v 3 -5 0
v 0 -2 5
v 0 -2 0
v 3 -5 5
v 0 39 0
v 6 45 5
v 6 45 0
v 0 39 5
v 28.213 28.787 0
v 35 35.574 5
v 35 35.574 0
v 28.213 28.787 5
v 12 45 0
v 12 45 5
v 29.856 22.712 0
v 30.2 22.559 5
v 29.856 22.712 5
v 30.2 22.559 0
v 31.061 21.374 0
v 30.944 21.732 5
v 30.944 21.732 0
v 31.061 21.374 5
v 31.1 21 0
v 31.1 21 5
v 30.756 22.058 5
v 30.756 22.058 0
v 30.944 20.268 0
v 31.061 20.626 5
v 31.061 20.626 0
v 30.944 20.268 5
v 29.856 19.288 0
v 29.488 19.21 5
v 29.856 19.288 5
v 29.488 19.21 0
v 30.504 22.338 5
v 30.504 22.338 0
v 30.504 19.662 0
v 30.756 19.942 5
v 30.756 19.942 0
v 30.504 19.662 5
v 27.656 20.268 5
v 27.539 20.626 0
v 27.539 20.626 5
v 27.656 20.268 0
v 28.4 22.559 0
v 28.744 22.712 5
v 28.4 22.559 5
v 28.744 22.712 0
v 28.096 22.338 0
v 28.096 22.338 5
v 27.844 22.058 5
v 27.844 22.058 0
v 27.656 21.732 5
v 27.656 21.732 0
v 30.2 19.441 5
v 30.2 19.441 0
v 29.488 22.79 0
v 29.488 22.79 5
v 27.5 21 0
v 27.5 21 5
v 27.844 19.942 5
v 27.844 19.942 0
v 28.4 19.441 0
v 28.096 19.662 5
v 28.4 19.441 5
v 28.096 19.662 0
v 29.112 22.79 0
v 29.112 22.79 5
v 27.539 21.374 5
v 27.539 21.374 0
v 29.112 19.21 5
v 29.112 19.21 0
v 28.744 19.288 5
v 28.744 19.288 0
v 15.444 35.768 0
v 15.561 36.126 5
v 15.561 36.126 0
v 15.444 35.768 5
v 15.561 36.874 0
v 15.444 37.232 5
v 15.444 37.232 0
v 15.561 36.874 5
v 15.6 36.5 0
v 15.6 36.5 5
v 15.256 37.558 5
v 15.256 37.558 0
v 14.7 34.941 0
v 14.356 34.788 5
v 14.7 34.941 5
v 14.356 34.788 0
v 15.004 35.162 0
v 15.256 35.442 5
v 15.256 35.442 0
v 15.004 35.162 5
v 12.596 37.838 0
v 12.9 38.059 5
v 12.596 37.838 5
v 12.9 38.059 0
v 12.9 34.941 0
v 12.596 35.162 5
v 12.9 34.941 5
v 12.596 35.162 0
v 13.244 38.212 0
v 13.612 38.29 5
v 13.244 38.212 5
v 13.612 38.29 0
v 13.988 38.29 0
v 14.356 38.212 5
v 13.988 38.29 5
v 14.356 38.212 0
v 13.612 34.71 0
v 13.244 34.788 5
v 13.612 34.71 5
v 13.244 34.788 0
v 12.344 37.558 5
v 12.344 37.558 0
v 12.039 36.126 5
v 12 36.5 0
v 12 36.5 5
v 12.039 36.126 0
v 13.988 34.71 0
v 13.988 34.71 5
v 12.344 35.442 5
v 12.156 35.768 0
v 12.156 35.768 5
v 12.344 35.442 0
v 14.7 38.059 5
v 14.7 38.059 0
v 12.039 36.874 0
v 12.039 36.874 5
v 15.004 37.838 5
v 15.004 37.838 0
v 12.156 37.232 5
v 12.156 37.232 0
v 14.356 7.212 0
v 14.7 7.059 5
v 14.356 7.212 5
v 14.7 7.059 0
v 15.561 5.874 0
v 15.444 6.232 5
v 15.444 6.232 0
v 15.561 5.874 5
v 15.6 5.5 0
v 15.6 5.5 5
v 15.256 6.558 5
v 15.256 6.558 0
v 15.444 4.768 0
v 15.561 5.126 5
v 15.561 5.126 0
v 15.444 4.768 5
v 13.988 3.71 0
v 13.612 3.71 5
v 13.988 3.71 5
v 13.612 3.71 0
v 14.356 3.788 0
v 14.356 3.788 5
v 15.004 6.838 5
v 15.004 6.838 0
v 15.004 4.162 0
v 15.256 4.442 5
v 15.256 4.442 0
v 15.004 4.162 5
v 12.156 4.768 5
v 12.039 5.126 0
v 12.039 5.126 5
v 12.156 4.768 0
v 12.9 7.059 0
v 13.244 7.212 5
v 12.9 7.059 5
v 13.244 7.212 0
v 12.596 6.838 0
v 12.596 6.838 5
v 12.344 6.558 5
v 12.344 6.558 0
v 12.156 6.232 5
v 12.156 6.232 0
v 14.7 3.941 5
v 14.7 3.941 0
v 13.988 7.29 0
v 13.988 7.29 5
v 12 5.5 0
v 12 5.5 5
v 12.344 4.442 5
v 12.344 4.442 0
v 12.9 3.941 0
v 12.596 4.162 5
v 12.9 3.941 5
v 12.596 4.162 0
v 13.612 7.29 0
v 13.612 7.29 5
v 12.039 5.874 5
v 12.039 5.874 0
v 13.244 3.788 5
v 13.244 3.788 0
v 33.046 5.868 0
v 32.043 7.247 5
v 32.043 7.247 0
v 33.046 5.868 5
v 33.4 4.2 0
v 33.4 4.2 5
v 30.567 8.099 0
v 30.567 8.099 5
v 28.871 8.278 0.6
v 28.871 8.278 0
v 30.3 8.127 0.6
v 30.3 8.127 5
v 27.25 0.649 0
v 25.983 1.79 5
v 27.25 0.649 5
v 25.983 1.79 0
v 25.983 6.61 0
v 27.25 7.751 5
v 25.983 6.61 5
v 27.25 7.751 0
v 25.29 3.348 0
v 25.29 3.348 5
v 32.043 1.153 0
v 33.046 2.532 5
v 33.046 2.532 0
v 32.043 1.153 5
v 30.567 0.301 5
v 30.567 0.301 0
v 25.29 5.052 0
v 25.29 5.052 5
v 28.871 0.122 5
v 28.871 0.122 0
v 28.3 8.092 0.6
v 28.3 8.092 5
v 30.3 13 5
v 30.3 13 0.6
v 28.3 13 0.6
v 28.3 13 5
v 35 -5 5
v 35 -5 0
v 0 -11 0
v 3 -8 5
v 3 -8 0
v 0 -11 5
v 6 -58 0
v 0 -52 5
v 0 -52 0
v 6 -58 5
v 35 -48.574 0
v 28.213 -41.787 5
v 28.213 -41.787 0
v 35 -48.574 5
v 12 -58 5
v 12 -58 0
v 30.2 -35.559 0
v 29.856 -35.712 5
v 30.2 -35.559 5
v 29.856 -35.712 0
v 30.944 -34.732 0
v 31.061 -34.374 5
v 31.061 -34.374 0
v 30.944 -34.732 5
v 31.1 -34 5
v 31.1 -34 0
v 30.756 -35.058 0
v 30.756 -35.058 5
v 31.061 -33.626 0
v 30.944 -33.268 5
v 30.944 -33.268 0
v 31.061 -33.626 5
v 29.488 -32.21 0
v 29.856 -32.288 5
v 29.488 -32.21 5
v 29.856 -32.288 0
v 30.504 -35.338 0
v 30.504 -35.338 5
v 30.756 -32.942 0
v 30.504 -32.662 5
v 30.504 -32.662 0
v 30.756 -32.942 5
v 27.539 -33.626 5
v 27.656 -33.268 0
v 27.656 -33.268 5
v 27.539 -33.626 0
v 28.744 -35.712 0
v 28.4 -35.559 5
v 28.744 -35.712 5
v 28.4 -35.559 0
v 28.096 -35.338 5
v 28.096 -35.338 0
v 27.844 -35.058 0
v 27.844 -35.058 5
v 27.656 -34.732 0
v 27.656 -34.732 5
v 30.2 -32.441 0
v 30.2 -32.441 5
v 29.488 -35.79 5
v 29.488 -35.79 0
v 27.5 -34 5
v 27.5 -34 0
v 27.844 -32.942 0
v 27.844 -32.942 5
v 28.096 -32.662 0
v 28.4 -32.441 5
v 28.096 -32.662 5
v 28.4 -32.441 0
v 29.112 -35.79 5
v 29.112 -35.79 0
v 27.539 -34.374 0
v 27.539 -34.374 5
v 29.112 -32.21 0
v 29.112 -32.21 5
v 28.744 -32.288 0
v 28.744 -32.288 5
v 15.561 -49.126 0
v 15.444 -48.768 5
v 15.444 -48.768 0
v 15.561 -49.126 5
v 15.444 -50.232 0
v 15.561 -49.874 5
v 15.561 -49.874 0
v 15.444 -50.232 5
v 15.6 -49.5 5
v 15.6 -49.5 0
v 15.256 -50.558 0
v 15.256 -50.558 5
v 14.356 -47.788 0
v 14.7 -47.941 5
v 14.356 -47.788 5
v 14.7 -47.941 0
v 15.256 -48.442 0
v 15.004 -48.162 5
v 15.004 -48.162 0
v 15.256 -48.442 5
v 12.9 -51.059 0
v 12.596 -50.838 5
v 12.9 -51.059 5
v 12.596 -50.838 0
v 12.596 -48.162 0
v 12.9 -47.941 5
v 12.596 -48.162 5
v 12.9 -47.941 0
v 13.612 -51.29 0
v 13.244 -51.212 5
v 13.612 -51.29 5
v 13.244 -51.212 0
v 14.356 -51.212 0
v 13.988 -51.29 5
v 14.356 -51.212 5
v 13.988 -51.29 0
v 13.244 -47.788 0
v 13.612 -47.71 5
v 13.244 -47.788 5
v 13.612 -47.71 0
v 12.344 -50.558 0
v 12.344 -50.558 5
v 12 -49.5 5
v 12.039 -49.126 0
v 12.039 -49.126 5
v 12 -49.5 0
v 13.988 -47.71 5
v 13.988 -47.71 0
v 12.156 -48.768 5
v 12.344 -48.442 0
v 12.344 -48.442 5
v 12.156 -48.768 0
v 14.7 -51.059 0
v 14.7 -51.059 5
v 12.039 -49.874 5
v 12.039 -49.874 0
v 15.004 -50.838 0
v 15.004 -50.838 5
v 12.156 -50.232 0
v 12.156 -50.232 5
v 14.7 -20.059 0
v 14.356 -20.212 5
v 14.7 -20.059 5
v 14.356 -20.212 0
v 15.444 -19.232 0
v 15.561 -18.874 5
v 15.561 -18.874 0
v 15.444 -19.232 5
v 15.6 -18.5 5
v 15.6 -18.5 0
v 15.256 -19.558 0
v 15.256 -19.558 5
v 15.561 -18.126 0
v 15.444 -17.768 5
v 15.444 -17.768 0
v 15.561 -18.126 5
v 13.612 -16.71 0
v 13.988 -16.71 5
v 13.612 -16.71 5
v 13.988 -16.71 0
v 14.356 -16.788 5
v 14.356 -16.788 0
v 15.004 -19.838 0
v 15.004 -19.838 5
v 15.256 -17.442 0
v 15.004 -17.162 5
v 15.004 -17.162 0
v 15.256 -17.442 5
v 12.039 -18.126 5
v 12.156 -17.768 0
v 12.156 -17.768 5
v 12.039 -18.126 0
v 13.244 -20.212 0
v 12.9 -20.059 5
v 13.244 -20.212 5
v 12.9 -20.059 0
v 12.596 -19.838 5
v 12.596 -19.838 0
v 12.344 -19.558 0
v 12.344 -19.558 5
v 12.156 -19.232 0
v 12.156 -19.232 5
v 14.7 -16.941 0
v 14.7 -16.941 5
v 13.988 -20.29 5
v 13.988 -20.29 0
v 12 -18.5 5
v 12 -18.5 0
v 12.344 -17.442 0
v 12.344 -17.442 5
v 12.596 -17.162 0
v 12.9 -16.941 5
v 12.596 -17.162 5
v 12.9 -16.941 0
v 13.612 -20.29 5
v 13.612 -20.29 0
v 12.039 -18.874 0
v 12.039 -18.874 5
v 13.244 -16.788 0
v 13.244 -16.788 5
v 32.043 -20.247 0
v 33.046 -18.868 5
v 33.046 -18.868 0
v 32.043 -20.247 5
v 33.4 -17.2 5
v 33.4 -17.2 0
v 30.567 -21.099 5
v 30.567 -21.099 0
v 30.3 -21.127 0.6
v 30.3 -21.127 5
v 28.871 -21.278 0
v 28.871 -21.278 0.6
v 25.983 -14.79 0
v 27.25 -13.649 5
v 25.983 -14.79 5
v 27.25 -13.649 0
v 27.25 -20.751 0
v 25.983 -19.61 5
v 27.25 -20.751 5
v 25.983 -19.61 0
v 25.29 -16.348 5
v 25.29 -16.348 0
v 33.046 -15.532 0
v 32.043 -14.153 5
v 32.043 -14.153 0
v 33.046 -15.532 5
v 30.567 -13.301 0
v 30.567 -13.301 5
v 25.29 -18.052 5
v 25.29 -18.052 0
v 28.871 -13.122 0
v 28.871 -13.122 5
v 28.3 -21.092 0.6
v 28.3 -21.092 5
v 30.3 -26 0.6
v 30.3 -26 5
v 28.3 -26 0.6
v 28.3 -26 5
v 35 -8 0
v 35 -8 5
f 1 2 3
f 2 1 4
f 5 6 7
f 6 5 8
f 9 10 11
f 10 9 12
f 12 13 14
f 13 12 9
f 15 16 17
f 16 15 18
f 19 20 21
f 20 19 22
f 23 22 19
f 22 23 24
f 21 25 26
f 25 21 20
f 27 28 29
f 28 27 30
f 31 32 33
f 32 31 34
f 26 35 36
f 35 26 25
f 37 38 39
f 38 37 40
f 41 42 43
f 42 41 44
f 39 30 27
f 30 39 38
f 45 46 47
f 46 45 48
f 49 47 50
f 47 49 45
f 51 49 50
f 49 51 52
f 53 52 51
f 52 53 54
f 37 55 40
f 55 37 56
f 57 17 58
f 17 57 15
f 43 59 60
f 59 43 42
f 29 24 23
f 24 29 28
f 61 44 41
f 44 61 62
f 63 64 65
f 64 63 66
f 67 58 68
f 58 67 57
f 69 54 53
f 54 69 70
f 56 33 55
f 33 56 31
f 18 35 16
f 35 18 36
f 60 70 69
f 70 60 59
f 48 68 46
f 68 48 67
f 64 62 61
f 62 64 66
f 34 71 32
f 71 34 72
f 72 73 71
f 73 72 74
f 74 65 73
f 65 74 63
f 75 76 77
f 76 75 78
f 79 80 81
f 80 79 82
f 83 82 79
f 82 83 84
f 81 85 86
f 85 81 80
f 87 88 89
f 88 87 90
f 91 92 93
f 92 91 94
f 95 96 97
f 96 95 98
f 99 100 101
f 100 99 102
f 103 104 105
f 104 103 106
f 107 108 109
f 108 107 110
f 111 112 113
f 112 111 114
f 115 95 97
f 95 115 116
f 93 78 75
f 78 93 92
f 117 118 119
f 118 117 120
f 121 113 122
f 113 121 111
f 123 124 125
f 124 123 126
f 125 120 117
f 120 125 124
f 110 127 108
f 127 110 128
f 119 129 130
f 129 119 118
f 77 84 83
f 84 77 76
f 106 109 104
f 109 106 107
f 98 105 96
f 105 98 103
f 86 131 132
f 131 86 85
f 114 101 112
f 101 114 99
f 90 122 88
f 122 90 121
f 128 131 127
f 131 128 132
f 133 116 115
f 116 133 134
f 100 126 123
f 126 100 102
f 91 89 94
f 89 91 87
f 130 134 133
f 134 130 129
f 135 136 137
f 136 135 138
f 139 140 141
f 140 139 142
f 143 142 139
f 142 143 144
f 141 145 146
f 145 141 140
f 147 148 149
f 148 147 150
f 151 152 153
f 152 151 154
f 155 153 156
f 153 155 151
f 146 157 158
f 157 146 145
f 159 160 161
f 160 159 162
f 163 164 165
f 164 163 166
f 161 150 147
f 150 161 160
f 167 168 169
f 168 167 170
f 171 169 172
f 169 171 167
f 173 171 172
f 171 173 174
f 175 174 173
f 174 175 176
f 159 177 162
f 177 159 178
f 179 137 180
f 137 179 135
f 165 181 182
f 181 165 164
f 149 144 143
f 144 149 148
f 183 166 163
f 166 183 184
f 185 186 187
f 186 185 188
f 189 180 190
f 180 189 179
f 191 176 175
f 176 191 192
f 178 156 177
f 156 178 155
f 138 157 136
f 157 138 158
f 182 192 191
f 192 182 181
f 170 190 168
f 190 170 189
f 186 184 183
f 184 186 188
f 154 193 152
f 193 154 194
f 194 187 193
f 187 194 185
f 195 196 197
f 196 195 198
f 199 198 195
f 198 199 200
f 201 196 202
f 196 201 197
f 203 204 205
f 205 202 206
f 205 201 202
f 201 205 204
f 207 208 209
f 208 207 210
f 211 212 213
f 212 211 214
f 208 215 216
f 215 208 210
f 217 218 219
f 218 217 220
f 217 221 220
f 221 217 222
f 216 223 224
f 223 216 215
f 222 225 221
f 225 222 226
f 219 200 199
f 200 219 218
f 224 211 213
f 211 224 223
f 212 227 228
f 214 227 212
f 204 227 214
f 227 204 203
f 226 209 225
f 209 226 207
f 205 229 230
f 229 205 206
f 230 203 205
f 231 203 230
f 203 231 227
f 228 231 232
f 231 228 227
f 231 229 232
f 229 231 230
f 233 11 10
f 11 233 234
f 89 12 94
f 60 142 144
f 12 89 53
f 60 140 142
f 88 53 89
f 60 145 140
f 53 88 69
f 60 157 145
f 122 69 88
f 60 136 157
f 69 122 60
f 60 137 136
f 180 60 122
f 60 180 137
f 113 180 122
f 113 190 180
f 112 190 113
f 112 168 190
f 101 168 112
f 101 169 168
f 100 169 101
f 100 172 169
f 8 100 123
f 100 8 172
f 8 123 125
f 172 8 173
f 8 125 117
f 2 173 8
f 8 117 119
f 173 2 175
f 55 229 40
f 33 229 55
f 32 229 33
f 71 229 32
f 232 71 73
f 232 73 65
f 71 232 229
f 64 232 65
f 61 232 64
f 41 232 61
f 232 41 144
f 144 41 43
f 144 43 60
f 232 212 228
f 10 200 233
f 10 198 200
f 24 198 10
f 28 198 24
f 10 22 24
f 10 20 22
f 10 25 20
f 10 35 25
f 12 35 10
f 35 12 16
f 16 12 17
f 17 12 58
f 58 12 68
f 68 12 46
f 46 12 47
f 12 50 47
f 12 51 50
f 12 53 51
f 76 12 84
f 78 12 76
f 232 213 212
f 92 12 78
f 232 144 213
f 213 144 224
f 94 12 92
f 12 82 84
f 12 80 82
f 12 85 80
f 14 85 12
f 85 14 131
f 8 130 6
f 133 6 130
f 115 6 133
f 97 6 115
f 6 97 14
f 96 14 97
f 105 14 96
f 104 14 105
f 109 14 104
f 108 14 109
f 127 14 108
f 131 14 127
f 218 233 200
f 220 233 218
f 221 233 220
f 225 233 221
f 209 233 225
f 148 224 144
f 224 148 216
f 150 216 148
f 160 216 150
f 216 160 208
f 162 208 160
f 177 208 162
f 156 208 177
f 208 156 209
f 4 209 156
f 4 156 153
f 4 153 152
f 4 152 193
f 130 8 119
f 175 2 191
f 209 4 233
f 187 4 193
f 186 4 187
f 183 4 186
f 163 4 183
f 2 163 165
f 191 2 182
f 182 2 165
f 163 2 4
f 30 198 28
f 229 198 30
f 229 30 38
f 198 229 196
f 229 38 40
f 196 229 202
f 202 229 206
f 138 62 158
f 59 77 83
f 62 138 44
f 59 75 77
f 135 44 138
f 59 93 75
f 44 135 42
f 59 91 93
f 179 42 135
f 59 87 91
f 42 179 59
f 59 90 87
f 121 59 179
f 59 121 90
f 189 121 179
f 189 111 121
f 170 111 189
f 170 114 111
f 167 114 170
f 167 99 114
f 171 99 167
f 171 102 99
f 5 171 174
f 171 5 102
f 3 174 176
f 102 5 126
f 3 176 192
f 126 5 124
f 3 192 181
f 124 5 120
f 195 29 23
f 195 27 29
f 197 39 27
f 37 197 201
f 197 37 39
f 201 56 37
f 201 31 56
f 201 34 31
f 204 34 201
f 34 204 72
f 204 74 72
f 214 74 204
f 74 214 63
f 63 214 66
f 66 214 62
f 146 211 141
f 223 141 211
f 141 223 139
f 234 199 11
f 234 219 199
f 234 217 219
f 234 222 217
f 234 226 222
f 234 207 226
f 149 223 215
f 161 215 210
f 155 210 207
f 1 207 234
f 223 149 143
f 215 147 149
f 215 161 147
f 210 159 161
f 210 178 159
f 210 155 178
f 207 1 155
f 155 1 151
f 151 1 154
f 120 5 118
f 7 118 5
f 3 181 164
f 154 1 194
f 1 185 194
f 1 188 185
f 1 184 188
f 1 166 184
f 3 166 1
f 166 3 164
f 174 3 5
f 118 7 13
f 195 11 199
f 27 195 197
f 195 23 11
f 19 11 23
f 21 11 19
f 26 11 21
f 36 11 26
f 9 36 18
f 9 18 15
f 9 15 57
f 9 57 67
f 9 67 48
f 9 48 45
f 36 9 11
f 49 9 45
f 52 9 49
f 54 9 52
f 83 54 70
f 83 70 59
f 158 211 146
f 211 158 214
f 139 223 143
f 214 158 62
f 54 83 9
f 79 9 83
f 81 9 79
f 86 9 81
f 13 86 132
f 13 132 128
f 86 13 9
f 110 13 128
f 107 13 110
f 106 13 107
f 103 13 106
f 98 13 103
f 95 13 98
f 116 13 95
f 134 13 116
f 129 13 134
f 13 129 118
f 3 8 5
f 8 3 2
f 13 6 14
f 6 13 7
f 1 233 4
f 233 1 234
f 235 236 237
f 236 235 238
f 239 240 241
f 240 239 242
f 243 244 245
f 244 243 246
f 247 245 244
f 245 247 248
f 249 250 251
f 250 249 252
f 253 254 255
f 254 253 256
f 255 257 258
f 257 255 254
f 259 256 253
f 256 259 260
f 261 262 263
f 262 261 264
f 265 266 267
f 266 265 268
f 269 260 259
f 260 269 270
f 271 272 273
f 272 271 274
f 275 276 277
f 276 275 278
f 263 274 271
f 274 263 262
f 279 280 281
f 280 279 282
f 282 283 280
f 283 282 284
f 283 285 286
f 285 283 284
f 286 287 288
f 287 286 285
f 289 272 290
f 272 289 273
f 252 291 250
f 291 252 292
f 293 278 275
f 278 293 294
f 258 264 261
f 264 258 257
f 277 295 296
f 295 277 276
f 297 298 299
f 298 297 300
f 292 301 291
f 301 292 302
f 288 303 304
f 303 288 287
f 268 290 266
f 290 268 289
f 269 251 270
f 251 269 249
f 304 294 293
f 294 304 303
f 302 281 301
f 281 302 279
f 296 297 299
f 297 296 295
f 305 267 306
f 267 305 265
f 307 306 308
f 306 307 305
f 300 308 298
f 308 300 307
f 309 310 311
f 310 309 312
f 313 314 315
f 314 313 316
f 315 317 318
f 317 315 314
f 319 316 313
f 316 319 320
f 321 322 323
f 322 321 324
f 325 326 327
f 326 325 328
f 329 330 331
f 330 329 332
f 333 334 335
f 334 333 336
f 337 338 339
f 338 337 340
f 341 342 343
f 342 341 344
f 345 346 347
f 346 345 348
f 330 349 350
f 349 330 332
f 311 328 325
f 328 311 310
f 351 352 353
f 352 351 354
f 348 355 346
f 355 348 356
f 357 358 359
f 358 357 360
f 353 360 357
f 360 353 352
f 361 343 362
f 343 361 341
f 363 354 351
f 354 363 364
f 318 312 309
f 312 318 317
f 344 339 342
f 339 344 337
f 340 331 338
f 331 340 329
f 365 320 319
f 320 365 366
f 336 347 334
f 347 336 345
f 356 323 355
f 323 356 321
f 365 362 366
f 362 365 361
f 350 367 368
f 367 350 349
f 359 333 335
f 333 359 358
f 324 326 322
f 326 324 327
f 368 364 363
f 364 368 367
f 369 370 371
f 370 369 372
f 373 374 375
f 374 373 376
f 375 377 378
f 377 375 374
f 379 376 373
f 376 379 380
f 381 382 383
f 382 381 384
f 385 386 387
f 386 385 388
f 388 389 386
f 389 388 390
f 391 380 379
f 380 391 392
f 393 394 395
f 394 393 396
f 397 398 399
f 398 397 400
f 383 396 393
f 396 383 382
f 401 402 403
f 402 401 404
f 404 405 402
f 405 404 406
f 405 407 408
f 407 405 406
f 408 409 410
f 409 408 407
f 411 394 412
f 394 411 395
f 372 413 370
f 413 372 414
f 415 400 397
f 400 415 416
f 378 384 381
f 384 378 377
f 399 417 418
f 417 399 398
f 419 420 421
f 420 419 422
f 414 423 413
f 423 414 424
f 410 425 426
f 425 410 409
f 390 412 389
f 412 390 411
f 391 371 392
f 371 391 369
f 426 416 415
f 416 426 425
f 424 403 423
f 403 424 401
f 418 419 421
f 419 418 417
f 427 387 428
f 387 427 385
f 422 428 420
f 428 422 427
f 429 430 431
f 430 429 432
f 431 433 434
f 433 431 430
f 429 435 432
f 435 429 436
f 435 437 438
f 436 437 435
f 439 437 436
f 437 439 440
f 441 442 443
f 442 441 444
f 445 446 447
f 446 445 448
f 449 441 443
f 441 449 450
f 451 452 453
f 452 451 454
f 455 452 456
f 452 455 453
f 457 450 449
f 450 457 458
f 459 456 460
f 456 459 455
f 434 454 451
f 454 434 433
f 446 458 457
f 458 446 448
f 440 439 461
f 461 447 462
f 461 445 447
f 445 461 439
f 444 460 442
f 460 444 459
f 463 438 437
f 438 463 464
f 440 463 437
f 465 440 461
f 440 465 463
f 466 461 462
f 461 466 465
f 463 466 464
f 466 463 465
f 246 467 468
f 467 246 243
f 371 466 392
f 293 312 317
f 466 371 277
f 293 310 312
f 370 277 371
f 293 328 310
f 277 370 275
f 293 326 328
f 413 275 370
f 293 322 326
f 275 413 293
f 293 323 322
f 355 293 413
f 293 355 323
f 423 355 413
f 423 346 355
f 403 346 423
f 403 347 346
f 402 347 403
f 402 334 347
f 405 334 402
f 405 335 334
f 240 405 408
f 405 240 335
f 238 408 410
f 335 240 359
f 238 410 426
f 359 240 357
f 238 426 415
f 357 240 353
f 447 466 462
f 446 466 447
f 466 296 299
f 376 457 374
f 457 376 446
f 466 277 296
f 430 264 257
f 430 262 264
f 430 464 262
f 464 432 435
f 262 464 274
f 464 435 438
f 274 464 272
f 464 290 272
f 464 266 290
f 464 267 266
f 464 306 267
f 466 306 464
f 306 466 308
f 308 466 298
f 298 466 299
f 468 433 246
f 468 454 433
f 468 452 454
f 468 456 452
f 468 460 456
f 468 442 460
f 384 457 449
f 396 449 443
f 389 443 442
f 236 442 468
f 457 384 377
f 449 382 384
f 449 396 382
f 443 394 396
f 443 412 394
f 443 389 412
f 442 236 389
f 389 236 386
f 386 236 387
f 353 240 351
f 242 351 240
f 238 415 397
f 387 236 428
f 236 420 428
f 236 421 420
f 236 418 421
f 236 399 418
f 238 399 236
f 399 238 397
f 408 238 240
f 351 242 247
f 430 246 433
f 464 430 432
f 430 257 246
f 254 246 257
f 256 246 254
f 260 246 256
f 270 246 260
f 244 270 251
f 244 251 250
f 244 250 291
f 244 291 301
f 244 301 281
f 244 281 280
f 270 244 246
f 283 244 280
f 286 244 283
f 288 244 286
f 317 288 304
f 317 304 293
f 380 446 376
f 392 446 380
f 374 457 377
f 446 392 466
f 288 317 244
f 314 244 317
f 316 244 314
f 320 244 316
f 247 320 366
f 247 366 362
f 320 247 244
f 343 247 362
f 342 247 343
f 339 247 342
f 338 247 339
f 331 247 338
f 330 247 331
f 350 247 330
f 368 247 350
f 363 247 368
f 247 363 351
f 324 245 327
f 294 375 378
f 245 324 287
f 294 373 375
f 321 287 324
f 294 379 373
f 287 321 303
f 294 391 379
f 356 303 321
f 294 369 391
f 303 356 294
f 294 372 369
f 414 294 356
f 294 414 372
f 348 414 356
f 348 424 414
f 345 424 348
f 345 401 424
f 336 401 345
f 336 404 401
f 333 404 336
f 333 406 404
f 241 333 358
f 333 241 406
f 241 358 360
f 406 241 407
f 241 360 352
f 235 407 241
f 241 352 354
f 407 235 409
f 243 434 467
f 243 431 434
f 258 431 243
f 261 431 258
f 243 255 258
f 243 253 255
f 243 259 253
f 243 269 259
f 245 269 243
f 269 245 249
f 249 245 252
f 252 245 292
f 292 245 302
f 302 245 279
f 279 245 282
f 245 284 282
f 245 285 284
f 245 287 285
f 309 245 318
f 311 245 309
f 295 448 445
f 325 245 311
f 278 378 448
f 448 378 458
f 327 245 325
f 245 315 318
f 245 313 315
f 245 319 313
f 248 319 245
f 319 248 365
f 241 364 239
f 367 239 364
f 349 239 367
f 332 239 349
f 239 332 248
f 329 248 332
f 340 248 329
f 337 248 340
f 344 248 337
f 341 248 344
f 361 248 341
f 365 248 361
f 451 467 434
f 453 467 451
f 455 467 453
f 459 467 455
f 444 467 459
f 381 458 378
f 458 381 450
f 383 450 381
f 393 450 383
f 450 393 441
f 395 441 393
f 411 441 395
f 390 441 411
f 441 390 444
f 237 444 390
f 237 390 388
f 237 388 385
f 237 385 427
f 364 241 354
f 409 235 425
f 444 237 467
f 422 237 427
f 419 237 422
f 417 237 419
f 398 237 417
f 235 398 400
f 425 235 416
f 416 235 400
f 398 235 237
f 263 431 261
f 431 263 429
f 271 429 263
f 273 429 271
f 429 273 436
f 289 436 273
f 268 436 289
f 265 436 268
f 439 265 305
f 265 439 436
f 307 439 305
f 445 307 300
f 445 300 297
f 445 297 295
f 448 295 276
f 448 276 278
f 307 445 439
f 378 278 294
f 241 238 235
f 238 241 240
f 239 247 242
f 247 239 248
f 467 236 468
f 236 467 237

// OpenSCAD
// PRUSA iteration3
// Z axis bottom holder
// GNU GPL v3
// Josef Průša <iam@josefprusa.cz> and contributors
// http://www.reprap.org/wiki/Prusa_Mendel
// http://prusamendel.org

module z_bottom_base(){

 translate([0,-5,0]) cube([35,50,5]); // plate touching the base
 //translate([0,-5,0]) cube([18,50,5]);
}

module z_bottom_fancy(){
 // corner cutouts
 translate([0.5,-2.5,0]) rotate([0,0,-45-180]) translate([-15,0,-1]) cube([30,30,51]);
 translate([0.5,40-0.5,0]) rotate([0,0,-45+90]) translate([-15,0,-1]) cube([30,30,51]);
 //translate([-4,40+5,5]) rotate([0,0,-35-0]) translate([0,0,0.1]) cube([30,30,51]);
 translate([-4+11,40+5+5,0]) rotate([0,0,-45-0]) translate([0,0,-1]) cube([30,30,51]);
 translate([8,0,12+20+6]) rotate([0,-90,0]) translate([0,-5,0]) cube([30,50,30]);
 translate([20,-2,12+8]) rotate([45,0,0]) rotate([0,-90,0]) translate([0,-5,0]) cube([30,50,30]);
 translate([8,20,12+30]) rotate([-45,0,0]) rotate([0,-90,0]) translate([0,-5,0]) cube([30,50,30]);
 translate([50-2.5,-5+2.5,0]) rotate([0,0,-45-90]) translate([-15,0,-1]) cube([30,30,51]);
 translate([50-1.5,10-1.5,0]) rotate([0,0,-45]) translate([-15,0,-1]) cube([30,30,51]);
 //translate([0,0,5]) rotate([45+180,0,0]) rotate([0,0,-45+90]) translate([0,0,-15]) cube([30,30,30]);
 // Stiffner cut out
 translate([30,0,5.5]) rotate([0,-45,0]) translate([0,-5,0]) cube([30,50,30]);
}

module z_bottom_holes(){
 // Frame mounting screw holes
 translate([-1,10,10+5]) rotate([0,90,0]) cylinder(h = 20, r=1.8, $fn=30);
 translate([-1,10+20,10+5]) rotate([0,90,0]) cylinder(h = 20, r=1.8, $fn=30);
 translate([-1,10+10,10+20+5]) rotate([0,90,0]) cylinder(h = 20, r=1.8, $fn=30);

 // Frame mounting screw head holes
 translate([4,10,10+5]) rotate([0,90,0]) cylinder(h = 20, r=3.1, $fn=30);
 translate([4,10+20,10+5]) rotate([0,90,0]) cylinder(h = 20, r=3.1, $fn=30);
 translate([4,10+10,10+20+5]) rotate([0,90,0]) cylinder(h = 20, r=3.1, $fn=30);
 translate([4,10+10-3.1,10+20+5]) cube([10,6.2,10]);

 // Z rod holder
 translate([25+4.3,4.2,-1]) rotate([0,0,0]) cylinder(h = 50, r=4.1, $fn=15);
 translate([25+4.3-1,3,0.6]) cube([2,10,7]); // it's bit up because it helps with printing

 // motor mounting
 translate([25+4.3,21,-1]){
 //translate([15.5,15.5,-1]) cylinder(h = 20, r=1.8, $fn=30);
 
 translate([0,0,-1]) cylinder(h = 20, r=1.8, $fn=30);
 translate([-15.5,15.5,-1]) cylinder(h = 20, r=1.8, $fn=30);
 translate([-15.5,-15.5,-1]) cylinder(h = 20, r=1.8, $fn=30);
 }

}

// Final part
module z_bottom_holder(){
 difference(){
  z_bottom_base();
  z_bottom_fancy();
  z_bottom_holes();
 }
 translate([0,-13,0]) mirror([0,1,0]) difference(){
  z_bottom_base();
  z_bottom_fancy();
  z_bottom_holes();
 }
}

z_bottom_holder();
